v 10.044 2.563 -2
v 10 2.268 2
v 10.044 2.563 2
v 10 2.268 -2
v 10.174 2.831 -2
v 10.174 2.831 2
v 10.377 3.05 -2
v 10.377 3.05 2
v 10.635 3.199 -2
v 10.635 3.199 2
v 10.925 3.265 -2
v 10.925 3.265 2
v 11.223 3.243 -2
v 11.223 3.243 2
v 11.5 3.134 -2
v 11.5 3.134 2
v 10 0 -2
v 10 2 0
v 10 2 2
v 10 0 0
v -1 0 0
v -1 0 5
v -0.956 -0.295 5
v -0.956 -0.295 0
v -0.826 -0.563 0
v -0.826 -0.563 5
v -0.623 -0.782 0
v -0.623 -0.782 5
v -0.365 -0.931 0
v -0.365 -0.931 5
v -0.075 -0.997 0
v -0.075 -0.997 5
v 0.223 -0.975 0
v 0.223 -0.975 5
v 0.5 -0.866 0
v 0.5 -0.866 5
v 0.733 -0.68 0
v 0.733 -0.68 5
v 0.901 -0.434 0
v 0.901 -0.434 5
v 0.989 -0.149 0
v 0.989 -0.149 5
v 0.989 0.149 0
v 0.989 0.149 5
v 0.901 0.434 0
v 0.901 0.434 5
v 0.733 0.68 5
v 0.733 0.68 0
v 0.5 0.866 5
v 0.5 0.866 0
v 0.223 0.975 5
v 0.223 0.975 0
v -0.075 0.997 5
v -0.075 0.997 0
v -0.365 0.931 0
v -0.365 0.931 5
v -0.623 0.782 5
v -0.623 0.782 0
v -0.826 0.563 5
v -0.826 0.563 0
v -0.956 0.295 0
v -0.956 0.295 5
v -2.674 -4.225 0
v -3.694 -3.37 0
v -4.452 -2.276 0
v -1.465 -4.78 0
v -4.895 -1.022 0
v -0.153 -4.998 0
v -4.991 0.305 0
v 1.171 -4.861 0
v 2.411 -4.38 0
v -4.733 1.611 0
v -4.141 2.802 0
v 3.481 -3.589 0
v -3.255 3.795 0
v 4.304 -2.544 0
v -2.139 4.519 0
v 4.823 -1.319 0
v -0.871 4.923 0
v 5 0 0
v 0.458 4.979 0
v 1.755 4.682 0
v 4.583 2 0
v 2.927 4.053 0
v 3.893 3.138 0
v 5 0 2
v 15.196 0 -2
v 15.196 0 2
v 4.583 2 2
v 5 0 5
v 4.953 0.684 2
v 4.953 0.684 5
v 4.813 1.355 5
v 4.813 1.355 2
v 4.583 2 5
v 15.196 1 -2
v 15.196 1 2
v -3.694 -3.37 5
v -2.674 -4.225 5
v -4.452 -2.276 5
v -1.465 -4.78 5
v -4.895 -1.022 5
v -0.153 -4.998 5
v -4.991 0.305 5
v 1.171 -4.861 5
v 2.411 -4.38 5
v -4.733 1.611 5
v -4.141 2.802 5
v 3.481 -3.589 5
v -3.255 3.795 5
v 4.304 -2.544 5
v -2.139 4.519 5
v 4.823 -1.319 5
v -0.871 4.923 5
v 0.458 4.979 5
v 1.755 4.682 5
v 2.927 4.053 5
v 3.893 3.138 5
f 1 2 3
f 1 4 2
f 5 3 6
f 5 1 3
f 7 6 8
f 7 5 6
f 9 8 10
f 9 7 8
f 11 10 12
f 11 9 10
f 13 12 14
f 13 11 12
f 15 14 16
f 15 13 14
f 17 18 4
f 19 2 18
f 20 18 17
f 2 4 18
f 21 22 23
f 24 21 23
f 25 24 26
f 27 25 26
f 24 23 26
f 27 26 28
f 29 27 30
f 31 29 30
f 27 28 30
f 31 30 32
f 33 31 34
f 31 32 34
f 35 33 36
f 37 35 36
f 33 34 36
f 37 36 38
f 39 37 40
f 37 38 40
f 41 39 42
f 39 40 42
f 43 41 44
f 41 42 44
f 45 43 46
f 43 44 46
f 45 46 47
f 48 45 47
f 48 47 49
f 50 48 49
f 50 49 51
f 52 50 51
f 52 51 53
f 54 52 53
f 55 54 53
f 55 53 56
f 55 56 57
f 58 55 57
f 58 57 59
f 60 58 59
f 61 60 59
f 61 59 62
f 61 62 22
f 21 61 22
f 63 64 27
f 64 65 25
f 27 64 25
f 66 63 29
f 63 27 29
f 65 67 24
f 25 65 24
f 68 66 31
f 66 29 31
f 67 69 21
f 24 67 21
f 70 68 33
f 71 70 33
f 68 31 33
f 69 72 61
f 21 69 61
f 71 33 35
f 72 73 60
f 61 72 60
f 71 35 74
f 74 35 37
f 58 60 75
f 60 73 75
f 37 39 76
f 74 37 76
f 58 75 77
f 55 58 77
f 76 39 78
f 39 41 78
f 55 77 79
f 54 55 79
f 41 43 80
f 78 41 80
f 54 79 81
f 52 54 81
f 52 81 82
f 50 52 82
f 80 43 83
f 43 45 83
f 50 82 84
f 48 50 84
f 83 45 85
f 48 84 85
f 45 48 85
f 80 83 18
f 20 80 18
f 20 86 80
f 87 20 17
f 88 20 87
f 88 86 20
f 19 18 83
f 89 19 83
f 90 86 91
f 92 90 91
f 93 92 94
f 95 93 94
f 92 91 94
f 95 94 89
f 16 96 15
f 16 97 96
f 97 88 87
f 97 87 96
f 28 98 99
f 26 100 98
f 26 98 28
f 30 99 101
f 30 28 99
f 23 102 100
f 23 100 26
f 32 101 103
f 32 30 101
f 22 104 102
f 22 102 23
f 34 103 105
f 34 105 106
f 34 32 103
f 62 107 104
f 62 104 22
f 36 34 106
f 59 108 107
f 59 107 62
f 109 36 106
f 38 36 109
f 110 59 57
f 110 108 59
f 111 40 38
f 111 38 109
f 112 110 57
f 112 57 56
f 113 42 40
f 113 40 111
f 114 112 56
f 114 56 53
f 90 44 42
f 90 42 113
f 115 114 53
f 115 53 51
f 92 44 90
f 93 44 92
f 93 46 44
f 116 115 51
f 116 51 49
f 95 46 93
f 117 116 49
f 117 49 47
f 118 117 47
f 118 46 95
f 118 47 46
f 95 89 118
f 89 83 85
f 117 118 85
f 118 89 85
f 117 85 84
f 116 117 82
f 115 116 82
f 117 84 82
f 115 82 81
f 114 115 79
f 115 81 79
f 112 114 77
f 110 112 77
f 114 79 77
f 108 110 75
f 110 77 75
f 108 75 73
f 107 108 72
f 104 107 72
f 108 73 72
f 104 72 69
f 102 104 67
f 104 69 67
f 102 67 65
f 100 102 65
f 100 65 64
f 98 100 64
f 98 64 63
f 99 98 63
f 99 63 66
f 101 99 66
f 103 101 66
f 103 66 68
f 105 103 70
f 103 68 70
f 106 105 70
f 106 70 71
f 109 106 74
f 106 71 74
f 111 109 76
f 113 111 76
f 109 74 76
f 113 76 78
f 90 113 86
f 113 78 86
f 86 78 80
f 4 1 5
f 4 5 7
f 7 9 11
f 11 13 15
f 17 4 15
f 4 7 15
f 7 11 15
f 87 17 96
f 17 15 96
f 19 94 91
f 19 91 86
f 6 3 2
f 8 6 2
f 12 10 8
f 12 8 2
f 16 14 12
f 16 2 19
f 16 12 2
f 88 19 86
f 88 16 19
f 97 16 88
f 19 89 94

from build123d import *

# Parameters (mm, degrees)
F1_DEPTH = 2
F2_DEPTH = 5
F3_DEPTH = 2
F4_R     = 1
F5_D     = 2


with BuildPart() as f1:
    # F0 (on Top) → F1 (new body)
    with BuildSketch(Plane.XY):
        with BuildLine():
            ThreePointArc((4.582575695, 2), (4.8945315647, 1.0215482184), (5, 0))
            Line((5, 0), (10, 0))
            Line((10, 0), (10, 2))
            Line((10, 2), (4.582575695, 2))
        make_face()
    extrude(amount=F1_DEPTH)

    # F0 (on Top) → F2 (join)
    with BuildSketch(Plane.XY):
        with BuildLine():
            ThreePointArc((4.582575695, 2), (-4.8945315647, -1.0215482184), (5, 0))
            ThreePointArc((5, 0), (4.8945315647, 1.0215482184), (4.582575695, 2))
        make_face()
    extrude(amount=F2_DEPTH)

    # F0 (on Top) → F3 (join, symmetric)
    with BuildSketch(Plane.XY):
        Polygon((10, 2), (10, 0), (15.196, 0), (15.196, 1), (10, 4), align=None)
    extrude(amount=F3_DEPTH, both=True)

    # F4
    f4_edges = [f1.edges().sort_by_distance(p)[0] for p in [
        (10, 4, 0),
    ]]
    fillet(f4_edges, radius=F4_R)

    # F5 (through all)
    with Locations(Plane(origin=(0, 0, 0), x_dir=(1, 0, 0), z_dir=(0, 0, -1))):
        with Locations((0, 0)):
            Hole(F5_D / 2)


solid = f1.part
